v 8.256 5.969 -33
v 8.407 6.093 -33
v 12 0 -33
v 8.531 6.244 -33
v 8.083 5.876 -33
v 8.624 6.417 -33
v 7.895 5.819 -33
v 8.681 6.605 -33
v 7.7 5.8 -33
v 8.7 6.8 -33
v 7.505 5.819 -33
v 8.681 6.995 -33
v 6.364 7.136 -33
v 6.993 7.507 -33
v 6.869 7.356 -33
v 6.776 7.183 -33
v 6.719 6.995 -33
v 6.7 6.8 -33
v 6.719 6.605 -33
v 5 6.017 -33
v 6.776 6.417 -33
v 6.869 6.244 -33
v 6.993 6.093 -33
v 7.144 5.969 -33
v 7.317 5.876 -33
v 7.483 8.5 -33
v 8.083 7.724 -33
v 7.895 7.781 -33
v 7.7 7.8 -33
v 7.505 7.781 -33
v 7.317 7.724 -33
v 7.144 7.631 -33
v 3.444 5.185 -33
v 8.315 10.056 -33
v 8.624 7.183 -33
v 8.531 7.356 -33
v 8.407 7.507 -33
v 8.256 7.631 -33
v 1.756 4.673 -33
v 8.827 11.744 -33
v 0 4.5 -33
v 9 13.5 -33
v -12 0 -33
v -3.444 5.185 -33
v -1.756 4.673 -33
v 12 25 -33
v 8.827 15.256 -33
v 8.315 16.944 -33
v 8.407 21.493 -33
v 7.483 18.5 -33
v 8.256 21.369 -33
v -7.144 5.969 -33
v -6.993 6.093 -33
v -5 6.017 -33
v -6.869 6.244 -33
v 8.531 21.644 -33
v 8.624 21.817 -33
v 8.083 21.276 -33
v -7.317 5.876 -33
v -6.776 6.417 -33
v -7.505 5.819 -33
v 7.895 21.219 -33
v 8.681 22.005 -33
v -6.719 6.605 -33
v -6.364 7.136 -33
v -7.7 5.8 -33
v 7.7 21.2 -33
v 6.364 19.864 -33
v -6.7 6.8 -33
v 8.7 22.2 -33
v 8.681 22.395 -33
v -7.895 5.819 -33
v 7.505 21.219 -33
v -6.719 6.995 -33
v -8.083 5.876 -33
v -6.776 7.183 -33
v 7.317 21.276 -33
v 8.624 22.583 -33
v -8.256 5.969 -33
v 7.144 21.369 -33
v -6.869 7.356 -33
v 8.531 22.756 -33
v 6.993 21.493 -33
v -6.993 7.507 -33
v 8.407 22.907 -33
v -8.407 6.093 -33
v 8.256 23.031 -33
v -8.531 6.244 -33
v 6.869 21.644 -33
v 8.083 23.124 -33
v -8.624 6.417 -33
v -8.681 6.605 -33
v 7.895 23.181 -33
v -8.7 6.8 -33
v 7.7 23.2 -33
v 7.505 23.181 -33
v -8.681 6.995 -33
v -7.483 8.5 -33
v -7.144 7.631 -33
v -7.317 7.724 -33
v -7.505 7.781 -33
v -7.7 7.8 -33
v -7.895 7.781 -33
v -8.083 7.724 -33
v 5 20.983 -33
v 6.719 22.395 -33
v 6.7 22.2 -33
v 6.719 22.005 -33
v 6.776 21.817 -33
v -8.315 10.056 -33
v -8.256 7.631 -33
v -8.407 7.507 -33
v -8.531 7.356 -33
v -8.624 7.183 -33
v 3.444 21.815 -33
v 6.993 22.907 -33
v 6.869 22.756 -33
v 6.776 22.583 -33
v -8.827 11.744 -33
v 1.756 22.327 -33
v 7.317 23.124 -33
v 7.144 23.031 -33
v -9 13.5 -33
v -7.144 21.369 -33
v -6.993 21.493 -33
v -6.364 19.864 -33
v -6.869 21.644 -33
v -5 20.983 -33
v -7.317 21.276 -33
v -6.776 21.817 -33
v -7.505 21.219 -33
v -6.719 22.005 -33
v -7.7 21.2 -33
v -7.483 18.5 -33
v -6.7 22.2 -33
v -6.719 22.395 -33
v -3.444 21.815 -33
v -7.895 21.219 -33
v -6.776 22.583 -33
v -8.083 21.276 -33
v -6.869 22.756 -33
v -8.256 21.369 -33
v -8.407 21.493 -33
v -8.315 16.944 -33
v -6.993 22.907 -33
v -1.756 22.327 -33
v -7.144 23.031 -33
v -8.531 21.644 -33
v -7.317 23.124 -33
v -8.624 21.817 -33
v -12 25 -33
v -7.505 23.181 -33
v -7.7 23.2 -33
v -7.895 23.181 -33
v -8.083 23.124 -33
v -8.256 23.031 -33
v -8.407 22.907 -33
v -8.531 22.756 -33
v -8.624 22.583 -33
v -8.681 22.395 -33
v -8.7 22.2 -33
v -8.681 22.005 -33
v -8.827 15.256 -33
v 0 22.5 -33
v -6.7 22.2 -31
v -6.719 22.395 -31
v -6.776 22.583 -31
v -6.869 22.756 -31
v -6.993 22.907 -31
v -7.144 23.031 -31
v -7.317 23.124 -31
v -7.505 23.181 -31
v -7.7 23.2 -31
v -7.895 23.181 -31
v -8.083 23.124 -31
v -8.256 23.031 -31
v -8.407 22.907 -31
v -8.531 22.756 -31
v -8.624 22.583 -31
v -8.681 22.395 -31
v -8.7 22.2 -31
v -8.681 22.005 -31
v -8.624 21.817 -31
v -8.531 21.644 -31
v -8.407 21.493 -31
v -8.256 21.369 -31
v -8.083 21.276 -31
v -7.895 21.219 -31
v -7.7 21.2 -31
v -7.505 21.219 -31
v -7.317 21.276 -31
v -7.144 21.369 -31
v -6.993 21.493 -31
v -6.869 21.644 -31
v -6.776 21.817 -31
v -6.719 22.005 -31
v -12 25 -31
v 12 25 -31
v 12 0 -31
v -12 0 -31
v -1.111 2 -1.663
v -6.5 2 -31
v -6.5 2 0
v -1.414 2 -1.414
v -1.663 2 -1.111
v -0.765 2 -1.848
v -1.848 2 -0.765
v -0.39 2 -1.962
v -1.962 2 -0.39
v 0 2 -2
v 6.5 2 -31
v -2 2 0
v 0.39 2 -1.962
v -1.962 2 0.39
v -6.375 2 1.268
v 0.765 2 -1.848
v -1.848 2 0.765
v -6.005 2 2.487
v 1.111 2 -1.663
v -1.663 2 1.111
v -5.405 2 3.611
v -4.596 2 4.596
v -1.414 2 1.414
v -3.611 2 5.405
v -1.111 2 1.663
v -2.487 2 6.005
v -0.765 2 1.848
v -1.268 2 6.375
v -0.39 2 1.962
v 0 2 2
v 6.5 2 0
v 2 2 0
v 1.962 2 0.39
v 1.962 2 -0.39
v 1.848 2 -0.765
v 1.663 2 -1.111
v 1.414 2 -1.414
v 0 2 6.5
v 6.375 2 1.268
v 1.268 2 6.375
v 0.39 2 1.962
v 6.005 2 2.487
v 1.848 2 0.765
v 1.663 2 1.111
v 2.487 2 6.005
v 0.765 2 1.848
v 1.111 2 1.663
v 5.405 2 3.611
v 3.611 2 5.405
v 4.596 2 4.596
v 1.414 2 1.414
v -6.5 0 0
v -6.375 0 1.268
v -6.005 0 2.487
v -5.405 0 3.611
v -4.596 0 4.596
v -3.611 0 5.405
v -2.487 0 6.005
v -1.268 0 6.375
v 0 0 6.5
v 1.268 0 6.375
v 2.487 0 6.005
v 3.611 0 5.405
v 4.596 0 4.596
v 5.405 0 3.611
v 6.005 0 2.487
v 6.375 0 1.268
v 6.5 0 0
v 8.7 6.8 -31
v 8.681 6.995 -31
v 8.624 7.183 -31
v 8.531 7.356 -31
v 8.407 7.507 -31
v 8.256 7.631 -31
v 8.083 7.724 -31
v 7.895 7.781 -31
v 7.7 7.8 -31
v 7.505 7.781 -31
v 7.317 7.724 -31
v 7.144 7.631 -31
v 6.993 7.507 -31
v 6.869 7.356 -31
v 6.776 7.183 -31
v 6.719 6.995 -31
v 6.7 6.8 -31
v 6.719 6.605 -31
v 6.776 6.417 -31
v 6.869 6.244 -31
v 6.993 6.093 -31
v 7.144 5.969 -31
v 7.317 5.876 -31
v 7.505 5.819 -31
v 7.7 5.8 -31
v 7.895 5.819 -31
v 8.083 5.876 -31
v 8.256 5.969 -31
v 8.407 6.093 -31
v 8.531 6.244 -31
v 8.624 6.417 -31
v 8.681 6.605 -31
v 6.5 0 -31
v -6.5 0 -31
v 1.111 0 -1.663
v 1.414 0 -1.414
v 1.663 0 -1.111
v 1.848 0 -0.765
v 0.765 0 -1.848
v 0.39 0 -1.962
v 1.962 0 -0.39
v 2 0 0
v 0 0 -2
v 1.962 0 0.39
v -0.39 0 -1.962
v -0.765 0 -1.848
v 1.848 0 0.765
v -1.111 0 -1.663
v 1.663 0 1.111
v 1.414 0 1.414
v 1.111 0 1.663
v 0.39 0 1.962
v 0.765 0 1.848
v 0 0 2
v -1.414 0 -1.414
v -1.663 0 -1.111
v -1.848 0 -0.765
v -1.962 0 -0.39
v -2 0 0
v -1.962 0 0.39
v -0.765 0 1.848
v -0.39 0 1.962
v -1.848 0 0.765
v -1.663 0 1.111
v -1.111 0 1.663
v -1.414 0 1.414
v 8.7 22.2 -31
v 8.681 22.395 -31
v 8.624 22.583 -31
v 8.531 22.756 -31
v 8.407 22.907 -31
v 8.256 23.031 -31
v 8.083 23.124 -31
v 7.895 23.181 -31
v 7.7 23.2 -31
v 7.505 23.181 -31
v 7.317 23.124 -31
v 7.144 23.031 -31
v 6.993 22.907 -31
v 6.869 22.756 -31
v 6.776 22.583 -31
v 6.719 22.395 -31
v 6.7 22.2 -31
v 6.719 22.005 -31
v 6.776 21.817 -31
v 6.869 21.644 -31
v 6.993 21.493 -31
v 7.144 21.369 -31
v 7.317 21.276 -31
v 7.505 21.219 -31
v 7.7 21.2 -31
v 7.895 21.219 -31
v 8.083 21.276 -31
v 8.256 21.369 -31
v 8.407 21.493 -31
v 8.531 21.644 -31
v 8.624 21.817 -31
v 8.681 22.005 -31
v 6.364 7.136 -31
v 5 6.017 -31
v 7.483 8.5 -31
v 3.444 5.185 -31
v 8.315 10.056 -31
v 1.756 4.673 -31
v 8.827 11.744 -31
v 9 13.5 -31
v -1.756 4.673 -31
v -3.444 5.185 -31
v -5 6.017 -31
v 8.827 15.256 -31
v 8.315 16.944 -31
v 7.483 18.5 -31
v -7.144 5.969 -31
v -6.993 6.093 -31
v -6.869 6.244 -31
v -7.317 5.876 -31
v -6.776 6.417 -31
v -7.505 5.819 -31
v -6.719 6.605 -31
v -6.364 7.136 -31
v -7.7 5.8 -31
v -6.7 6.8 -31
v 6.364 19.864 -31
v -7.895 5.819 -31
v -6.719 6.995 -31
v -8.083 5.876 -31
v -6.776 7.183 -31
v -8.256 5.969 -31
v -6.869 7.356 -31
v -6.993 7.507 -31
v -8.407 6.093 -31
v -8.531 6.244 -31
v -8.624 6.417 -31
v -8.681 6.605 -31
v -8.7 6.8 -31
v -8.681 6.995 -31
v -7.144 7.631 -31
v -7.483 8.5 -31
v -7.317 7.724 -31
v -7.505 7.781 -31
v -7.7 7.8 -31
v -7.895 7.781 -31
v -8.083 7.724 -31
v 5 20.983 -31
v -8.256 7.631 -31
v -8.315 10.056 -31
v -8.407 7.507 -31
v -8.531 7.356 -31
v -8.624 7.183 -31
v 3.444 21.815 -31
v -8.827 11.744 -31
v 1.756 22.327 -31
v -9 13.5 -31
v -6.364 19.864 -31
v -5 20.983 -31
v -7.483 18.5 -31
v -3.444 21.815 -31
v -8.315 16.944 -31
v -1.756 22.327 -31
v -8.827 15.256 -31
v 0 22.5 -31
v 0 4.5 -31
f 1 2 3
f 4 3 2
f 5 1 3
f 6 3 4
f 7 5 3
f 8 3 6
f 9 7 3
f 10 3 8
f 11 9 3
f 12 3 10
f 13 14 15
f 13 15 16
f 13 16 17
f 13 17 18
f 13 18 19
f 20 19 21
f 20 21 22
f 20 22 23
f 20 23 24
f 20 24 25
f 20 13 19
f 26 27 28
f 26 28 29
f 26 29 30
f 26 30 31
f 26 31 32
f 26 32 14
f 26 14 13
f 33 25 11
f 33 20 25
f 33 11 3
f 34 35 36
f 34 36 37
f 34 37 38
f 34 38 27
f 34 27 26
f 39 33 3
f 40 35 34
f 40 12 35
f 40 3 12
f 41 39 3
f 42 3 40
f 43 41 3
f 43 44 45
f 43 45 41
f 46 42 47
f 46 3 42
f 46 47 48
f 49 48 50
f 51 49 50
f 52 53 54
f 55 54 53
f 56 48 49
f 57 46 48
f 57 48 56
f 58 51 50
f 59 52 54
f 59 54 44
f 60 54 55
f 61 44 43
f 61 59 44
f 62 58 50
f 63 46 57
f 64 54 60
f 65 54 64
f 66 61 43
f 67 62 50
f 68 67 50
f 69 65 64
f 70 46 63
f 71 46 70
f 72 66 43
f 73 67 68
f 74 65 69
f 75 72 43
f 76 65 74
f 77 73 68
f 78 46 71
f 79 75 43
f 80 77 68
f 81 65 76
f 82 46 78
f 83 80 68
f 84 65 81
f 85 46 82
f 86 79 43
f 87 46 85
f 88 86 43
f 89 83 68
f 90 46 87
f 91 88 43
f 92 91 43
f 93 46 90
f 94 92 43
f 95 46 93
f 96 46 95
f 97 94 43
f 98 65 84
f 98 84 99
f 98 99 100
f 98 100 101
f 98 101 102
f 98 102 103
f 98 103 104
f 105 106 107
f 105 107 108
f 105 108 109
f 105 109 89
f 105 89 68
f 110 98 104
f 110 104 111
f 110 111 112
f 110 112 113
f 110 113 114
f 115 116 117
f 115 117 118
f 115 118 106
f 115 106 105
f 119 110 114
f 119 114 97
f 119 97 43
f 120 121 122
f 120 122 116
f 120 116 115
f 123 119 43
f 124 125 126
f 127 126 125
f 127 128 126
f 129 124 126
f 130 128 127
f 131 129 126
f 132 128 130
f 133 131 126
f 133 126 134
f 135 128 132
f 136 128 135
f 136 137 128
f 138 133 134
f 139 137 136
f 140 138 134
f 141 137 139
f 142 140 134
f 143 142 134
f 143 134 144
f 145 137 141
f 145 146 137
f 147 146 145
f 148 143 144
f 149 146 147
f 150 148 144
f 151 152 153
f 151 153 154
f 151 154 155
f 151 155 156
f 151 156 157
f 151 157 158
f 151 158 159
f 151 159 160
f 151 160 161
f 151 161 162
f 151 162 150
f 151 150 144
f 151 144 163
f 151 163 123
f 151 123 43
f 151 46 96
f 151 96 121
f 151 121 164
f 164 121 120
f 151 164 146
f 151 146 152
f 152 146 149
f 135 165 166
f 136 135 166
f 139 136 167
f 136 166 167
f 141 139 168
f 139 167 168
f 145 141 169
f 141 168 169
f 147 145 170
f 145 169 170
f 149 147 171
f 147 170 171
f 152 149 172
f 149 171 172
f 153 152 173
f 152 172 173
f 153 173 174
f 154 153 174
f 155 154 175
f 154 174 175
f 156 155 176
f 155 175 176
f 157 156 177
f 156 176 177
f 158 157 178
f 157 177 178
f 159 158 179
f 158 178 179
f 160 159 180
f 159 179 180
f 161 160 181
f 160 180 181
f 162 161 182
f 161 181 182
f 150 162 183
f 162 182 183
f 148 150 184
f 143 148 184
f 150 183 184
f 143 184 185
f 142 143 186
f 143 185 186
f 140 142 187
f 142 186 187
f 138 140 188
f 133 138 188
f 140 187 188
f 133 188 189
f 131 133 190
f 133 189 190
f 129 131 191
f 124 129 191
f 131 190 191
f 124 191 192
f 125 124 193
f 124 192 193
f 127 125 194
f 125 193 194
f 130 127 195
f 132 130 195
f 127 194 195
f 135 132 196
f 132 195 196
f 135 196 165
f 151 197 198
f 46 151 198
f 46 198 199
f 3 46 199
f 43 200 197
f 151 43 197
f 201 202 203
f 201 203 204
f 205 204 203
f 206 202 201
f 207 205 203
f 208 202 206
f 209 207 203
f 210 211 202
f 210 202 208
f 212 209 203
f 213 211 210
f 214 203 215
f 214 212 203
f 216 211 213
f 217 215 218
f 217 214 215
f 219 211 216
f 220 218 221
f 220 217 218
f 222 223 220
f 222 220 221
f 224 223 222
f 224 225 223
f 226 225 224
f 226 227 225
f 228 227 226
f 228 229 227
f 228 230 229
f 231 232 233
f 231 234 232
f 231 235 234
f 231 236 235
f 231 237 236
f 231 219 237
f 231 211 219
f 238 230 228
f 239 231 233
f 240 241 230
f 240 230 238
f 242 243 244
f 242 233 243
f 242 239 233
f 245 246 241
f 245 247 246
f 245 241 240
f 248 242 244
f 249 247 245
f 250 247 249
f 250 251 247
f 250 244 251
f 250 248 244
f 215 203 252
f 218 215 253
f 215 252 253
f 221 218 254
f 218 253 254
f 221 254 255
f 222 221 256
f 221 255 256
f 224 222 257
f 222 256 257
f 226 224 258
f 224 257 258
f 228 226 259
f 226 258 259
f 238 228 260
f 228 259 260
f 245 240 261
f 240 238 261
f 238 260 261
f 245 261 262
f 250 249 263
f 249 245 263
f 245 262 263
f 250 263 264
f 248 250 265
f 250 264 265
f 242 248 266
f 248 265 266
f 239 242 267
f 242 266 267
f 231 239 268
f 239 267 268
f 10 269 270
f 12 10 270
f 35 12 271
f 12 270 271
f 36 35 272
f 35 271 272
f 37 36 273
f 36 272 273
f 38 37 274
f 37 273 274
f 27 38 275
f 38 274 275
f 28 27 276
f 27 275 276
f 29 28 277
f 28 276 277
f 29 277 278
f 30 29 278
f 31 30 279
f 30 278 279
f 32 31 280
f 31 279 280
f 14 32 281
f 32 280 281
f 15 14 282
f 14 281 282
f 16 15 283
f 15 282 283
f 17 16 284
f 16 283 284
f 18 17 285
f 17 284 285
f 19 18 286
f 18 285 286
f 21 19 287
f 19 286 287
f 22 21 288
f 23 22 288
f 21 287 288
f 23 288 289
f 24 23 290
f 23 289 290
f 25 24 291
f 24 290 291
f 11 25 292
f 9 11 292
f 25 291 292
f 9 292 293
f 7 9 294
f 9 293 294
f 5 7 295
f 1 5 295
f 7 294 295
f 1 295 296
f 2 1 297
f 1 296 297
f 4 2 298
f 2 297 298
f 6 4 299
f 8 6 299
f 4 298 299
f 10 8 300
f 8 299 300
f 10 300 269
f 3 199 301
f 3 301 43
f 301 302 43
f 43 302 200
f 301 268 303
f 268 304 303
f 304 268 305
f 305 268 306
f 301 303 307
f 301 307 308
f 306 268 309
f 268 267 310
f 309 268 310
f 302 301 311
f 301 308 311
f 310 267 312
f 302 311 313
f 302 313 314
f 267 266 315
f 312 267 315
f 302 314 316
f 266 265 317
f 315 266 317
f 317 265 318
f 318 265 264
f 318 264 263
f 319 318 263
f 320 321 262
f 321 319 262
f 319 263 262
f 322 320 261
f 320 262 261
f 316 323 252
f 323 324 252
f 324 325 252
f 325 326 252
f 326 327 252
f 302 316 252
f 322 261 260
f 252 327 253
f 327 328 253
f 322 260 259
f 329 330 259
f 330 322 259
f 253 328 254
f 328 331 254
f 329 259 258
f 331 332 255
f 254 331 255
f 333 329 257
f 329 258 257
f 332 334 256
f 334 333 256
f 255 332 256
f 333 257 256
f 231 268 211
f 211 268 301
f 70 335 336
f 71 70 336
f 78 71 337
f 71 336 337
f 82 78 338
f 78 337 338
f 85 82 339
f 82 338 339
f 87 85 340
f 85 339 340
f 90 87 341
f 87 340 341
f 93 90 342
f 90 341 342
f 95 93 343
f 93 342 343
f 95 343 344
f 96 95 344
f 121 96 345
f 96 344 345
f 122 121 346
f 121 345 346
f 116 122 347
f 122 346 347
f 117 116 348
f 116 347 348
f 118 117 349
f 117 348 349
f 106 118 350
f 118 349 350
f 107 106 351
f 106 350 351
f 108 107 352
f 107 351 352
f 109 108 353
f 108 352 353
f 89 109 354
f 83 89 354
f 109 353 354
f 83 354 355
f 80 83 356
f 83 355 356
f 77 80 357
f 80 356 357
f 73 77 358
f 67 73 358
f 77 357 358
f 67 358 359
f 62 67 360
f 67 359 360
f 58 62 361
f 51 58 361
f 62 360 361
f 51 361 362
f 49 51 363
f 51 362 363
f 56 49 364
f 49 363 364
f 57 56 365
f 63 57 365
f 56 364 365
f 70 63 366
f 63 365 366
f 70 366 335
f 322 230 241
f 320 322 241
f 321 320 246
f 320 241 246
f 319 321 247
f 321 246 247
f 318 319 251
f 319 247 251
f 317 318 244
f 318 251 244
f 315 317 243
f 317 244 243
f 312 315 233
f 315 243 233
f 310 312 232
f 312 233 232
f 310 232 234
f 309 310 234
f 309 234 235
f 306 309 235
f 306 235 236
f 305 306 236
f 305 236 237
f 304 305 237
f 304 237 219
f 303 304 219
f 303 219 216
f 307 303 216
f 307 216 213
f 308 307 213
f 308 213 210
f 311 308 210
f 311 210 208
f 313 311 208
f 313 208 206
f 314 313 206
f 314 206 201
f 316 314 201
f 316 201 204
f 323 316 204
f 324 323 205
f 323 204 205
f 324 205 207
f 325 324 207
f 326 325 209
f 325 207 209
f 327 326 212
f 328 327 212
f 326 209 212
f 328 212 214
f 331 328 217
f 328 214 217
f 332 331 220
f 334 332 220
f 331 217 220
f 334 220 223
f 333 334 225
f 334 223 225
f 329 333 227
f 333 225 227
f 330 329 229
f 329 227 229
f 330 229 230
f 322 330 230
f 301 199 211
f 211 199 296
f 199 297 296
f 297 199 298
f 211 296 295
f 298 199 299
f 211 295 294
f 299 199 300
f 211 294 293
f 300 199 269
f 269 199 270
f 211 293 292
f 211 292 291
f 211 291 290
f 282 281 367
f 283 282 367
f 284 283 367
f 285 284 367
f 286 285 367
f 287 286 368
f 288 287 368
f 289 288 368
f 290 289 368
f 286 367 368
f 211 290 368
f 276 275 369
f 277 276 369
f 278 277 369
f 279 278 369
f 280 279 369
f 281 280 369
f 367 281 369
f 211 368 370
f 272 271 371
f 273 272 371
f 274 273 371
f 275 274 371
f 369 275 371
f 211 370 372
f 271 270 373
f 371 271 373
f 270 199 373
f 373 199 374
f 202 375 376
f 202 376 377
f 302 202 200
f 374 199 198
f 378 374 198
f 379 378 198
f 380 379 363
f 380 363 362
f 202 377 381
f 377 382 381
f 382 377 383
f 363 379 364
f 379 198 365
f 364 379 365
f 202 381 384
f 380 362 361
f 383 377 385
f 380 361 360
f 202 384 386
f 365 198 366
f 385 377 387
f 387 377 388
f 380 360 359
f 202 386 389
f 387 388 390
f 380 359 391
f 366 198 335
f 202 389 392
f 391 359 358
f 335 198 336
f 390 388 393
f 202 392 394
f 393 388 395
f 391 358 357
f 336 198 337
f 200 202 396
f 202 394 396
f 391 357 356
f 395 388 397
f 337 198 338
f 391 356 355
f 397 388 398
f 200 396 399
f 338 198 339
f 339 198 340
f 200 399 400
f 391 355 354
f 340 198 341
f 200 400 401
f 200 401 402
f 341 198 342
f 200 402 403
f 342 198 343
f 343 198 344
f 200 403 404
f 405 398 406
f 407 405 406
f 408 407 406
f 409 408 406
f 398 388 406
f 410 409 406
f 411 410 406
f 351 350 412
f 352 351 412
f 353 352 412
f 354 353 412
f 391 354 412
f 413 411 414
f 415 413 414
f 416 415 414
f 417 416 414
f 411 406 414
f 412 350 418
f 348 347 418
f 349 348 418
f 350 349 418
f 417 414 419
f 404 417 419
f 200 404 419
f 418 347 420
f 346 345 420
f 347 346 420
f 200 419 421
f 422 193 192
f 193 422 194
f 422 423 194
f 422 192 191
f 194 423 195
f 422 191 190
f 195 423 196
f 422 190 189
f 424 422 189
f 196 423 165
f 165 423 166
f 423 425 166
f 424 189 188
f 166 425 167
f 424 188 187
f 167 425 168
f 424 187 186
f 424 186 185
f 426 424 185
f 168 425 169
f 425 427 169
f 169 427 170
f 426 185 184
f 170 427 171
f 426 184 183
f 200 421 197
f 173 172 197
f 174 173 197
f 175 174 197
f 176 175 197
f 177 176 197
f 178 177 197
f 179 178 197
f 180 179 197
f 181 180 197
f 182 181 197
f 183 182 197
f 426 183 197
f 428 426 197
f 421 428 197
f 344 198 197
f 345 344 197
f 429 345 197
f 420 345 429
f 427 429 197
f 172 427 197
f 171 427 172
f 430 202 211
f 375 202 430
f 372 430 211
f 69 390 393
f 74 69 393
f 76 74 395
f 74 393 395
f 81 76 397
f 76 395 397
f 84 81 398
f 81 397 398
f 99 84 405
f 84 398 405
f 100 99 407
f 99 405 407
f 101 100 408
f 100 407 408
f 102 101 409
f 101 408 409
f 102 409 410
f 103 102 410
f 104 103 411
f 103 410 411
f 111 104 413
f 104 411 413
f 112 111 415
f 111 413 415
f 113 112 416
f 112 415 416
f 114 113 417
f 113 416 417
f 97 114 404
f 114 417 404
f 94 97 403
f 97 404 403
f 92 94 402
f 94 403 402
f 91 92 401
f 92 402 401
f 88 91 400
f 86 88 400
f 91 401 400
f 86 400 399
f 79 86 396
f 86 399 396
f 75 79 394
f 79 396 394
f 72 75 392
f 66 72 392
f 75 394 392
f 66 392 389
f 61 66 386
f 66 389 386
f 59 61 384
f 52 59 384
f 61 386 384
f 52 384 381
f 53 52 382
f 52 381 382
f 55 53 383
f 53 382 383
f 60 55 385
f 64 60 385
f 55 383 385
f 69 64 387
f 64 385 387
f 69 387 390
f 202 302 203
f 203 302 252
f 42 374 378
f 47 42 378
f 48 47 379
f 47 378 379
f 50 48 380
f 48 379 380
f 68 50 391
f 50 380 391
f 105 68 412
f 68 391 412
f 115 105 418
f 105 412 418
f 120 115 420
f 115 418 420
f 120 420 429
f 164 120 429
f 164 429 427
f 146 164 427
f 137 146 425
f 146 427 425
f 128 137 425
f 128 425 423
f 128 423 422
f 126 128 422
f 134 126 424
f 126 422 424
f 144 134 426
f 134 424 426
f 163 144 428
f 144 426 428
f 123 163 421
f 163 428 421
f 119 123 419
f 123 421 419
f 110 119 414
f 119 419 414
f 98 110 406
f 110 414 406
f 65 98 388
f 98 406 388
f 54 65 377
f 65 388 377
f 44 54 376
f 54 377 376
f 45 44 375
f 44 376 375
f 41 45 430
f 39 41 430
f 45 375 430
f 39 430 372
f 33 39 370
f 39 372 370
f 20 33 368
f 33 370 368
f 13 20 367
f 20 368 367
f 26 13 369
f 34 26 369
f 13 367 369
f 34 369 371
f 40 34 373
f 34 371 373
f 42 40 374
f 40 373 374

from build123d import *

# Parameters (mm, degrees)
SKETCH_2_R          = 6.5
EXTRUDE_1_DEPTH     = 2
SKETCH_3_R          = 2
CUT_EXTRUDE_2_DEPTH = 10.407443861
EXTRUDE_START       = -2
EXTRUDE_2_DEPTH     = 2
EXTRUDE_3_DEPTH     = 2
SKETCH_22_R         = 9
SKETCH_22_R_2       = 1
CUT_EXTRUDE_4_DEPTH = 2


with BuildPart() as part:
    # 草图2 → 凸台-拉伸1 (new body)
    with BuildSketch(Plane(origin=(0, 0, 0), x_dir=(1, 0, 0), z_dir=(0, 1, 0))):
        with Locations(Location((0, 0, 0), (0, 0, 270))):
            Circle(SKETCH_2_R)
    extrude(amount=EXTRUDE_1_DEPTH)

    # 草图3 → 切除-拉伸2 (cut, through all)
    with BuildSketch(Plane(origin=(0, 2, 0), x_dir=(1, 0, 0), z_dir=(0, 1, 0))):
        with Locations(Location((0, 0, 0), (0, 0, 270))):
            Circle(SKETCH_3_R)
    extrude(amount=-CUT_EXTRUDE_2_DEPTH, mode=Mode.SUBTRACT)

    # 草图4 → 凸台-拉伸2 (add)
    with BuildSketch(Plane(origin=(0, 2, 0), x_dir=(1, 0, 0), z_dir=(0, 1, 0)).offset(EXTRUDE_START)):
        with BuildLine():
            Line((6.5, 0), (6.5, 31))
            Line((6.5, 31), (3.899148682, 31))
            Line((3.899148682, 31), (-4.100851318, 31))
            Line((-4.100851318, 31), (-6.5, 31))
            Line((-6.5, 31), (-6.5, 0))
            ThreePointArc((-6.5, 0), (0, 6.5), (6.5, 0))
        make_face()
    extrude(amount=EXTRUDE_2_DEPTH)

    # 草图21 → 凸台-拉伸3 (add)
    with BuildSketch(Plane(origin=(0, 0, -31), x_dir=(-1, 0, 0), z_dir=(0, 0, -1))):
        Polygon((0, 0), (12, 0), (12, 25), (-12, 25), (-12, 0), align=None)
    extrude(amount=EXTRUDE_3_DEPTH)

    # 草图22 → 切除-拉伸4 (cut)
    with BuildSketch(Plane.XY.offset(-31)):
        with Locations((0, 13.5)):
            Circle(SKETCH_22_R)
        with Locations((7.7, 22.2)):
            Circle(SKETCH_22_R_2)
        with Locations((-7.7, 22.2)):
            Circle(SKETCH_22_R_2)
        with Locations((-7.7, 6.8)):
            Circle(SKETCH_22_R_2)
        with Locations((7.7, 6.8)):
            Circle(SKETCH_22_R_2)
    extrude(amount=-CUT_EXTRUDE_4_DEPTH, mode=Mode.SUBTRACT)


solid = part.part
